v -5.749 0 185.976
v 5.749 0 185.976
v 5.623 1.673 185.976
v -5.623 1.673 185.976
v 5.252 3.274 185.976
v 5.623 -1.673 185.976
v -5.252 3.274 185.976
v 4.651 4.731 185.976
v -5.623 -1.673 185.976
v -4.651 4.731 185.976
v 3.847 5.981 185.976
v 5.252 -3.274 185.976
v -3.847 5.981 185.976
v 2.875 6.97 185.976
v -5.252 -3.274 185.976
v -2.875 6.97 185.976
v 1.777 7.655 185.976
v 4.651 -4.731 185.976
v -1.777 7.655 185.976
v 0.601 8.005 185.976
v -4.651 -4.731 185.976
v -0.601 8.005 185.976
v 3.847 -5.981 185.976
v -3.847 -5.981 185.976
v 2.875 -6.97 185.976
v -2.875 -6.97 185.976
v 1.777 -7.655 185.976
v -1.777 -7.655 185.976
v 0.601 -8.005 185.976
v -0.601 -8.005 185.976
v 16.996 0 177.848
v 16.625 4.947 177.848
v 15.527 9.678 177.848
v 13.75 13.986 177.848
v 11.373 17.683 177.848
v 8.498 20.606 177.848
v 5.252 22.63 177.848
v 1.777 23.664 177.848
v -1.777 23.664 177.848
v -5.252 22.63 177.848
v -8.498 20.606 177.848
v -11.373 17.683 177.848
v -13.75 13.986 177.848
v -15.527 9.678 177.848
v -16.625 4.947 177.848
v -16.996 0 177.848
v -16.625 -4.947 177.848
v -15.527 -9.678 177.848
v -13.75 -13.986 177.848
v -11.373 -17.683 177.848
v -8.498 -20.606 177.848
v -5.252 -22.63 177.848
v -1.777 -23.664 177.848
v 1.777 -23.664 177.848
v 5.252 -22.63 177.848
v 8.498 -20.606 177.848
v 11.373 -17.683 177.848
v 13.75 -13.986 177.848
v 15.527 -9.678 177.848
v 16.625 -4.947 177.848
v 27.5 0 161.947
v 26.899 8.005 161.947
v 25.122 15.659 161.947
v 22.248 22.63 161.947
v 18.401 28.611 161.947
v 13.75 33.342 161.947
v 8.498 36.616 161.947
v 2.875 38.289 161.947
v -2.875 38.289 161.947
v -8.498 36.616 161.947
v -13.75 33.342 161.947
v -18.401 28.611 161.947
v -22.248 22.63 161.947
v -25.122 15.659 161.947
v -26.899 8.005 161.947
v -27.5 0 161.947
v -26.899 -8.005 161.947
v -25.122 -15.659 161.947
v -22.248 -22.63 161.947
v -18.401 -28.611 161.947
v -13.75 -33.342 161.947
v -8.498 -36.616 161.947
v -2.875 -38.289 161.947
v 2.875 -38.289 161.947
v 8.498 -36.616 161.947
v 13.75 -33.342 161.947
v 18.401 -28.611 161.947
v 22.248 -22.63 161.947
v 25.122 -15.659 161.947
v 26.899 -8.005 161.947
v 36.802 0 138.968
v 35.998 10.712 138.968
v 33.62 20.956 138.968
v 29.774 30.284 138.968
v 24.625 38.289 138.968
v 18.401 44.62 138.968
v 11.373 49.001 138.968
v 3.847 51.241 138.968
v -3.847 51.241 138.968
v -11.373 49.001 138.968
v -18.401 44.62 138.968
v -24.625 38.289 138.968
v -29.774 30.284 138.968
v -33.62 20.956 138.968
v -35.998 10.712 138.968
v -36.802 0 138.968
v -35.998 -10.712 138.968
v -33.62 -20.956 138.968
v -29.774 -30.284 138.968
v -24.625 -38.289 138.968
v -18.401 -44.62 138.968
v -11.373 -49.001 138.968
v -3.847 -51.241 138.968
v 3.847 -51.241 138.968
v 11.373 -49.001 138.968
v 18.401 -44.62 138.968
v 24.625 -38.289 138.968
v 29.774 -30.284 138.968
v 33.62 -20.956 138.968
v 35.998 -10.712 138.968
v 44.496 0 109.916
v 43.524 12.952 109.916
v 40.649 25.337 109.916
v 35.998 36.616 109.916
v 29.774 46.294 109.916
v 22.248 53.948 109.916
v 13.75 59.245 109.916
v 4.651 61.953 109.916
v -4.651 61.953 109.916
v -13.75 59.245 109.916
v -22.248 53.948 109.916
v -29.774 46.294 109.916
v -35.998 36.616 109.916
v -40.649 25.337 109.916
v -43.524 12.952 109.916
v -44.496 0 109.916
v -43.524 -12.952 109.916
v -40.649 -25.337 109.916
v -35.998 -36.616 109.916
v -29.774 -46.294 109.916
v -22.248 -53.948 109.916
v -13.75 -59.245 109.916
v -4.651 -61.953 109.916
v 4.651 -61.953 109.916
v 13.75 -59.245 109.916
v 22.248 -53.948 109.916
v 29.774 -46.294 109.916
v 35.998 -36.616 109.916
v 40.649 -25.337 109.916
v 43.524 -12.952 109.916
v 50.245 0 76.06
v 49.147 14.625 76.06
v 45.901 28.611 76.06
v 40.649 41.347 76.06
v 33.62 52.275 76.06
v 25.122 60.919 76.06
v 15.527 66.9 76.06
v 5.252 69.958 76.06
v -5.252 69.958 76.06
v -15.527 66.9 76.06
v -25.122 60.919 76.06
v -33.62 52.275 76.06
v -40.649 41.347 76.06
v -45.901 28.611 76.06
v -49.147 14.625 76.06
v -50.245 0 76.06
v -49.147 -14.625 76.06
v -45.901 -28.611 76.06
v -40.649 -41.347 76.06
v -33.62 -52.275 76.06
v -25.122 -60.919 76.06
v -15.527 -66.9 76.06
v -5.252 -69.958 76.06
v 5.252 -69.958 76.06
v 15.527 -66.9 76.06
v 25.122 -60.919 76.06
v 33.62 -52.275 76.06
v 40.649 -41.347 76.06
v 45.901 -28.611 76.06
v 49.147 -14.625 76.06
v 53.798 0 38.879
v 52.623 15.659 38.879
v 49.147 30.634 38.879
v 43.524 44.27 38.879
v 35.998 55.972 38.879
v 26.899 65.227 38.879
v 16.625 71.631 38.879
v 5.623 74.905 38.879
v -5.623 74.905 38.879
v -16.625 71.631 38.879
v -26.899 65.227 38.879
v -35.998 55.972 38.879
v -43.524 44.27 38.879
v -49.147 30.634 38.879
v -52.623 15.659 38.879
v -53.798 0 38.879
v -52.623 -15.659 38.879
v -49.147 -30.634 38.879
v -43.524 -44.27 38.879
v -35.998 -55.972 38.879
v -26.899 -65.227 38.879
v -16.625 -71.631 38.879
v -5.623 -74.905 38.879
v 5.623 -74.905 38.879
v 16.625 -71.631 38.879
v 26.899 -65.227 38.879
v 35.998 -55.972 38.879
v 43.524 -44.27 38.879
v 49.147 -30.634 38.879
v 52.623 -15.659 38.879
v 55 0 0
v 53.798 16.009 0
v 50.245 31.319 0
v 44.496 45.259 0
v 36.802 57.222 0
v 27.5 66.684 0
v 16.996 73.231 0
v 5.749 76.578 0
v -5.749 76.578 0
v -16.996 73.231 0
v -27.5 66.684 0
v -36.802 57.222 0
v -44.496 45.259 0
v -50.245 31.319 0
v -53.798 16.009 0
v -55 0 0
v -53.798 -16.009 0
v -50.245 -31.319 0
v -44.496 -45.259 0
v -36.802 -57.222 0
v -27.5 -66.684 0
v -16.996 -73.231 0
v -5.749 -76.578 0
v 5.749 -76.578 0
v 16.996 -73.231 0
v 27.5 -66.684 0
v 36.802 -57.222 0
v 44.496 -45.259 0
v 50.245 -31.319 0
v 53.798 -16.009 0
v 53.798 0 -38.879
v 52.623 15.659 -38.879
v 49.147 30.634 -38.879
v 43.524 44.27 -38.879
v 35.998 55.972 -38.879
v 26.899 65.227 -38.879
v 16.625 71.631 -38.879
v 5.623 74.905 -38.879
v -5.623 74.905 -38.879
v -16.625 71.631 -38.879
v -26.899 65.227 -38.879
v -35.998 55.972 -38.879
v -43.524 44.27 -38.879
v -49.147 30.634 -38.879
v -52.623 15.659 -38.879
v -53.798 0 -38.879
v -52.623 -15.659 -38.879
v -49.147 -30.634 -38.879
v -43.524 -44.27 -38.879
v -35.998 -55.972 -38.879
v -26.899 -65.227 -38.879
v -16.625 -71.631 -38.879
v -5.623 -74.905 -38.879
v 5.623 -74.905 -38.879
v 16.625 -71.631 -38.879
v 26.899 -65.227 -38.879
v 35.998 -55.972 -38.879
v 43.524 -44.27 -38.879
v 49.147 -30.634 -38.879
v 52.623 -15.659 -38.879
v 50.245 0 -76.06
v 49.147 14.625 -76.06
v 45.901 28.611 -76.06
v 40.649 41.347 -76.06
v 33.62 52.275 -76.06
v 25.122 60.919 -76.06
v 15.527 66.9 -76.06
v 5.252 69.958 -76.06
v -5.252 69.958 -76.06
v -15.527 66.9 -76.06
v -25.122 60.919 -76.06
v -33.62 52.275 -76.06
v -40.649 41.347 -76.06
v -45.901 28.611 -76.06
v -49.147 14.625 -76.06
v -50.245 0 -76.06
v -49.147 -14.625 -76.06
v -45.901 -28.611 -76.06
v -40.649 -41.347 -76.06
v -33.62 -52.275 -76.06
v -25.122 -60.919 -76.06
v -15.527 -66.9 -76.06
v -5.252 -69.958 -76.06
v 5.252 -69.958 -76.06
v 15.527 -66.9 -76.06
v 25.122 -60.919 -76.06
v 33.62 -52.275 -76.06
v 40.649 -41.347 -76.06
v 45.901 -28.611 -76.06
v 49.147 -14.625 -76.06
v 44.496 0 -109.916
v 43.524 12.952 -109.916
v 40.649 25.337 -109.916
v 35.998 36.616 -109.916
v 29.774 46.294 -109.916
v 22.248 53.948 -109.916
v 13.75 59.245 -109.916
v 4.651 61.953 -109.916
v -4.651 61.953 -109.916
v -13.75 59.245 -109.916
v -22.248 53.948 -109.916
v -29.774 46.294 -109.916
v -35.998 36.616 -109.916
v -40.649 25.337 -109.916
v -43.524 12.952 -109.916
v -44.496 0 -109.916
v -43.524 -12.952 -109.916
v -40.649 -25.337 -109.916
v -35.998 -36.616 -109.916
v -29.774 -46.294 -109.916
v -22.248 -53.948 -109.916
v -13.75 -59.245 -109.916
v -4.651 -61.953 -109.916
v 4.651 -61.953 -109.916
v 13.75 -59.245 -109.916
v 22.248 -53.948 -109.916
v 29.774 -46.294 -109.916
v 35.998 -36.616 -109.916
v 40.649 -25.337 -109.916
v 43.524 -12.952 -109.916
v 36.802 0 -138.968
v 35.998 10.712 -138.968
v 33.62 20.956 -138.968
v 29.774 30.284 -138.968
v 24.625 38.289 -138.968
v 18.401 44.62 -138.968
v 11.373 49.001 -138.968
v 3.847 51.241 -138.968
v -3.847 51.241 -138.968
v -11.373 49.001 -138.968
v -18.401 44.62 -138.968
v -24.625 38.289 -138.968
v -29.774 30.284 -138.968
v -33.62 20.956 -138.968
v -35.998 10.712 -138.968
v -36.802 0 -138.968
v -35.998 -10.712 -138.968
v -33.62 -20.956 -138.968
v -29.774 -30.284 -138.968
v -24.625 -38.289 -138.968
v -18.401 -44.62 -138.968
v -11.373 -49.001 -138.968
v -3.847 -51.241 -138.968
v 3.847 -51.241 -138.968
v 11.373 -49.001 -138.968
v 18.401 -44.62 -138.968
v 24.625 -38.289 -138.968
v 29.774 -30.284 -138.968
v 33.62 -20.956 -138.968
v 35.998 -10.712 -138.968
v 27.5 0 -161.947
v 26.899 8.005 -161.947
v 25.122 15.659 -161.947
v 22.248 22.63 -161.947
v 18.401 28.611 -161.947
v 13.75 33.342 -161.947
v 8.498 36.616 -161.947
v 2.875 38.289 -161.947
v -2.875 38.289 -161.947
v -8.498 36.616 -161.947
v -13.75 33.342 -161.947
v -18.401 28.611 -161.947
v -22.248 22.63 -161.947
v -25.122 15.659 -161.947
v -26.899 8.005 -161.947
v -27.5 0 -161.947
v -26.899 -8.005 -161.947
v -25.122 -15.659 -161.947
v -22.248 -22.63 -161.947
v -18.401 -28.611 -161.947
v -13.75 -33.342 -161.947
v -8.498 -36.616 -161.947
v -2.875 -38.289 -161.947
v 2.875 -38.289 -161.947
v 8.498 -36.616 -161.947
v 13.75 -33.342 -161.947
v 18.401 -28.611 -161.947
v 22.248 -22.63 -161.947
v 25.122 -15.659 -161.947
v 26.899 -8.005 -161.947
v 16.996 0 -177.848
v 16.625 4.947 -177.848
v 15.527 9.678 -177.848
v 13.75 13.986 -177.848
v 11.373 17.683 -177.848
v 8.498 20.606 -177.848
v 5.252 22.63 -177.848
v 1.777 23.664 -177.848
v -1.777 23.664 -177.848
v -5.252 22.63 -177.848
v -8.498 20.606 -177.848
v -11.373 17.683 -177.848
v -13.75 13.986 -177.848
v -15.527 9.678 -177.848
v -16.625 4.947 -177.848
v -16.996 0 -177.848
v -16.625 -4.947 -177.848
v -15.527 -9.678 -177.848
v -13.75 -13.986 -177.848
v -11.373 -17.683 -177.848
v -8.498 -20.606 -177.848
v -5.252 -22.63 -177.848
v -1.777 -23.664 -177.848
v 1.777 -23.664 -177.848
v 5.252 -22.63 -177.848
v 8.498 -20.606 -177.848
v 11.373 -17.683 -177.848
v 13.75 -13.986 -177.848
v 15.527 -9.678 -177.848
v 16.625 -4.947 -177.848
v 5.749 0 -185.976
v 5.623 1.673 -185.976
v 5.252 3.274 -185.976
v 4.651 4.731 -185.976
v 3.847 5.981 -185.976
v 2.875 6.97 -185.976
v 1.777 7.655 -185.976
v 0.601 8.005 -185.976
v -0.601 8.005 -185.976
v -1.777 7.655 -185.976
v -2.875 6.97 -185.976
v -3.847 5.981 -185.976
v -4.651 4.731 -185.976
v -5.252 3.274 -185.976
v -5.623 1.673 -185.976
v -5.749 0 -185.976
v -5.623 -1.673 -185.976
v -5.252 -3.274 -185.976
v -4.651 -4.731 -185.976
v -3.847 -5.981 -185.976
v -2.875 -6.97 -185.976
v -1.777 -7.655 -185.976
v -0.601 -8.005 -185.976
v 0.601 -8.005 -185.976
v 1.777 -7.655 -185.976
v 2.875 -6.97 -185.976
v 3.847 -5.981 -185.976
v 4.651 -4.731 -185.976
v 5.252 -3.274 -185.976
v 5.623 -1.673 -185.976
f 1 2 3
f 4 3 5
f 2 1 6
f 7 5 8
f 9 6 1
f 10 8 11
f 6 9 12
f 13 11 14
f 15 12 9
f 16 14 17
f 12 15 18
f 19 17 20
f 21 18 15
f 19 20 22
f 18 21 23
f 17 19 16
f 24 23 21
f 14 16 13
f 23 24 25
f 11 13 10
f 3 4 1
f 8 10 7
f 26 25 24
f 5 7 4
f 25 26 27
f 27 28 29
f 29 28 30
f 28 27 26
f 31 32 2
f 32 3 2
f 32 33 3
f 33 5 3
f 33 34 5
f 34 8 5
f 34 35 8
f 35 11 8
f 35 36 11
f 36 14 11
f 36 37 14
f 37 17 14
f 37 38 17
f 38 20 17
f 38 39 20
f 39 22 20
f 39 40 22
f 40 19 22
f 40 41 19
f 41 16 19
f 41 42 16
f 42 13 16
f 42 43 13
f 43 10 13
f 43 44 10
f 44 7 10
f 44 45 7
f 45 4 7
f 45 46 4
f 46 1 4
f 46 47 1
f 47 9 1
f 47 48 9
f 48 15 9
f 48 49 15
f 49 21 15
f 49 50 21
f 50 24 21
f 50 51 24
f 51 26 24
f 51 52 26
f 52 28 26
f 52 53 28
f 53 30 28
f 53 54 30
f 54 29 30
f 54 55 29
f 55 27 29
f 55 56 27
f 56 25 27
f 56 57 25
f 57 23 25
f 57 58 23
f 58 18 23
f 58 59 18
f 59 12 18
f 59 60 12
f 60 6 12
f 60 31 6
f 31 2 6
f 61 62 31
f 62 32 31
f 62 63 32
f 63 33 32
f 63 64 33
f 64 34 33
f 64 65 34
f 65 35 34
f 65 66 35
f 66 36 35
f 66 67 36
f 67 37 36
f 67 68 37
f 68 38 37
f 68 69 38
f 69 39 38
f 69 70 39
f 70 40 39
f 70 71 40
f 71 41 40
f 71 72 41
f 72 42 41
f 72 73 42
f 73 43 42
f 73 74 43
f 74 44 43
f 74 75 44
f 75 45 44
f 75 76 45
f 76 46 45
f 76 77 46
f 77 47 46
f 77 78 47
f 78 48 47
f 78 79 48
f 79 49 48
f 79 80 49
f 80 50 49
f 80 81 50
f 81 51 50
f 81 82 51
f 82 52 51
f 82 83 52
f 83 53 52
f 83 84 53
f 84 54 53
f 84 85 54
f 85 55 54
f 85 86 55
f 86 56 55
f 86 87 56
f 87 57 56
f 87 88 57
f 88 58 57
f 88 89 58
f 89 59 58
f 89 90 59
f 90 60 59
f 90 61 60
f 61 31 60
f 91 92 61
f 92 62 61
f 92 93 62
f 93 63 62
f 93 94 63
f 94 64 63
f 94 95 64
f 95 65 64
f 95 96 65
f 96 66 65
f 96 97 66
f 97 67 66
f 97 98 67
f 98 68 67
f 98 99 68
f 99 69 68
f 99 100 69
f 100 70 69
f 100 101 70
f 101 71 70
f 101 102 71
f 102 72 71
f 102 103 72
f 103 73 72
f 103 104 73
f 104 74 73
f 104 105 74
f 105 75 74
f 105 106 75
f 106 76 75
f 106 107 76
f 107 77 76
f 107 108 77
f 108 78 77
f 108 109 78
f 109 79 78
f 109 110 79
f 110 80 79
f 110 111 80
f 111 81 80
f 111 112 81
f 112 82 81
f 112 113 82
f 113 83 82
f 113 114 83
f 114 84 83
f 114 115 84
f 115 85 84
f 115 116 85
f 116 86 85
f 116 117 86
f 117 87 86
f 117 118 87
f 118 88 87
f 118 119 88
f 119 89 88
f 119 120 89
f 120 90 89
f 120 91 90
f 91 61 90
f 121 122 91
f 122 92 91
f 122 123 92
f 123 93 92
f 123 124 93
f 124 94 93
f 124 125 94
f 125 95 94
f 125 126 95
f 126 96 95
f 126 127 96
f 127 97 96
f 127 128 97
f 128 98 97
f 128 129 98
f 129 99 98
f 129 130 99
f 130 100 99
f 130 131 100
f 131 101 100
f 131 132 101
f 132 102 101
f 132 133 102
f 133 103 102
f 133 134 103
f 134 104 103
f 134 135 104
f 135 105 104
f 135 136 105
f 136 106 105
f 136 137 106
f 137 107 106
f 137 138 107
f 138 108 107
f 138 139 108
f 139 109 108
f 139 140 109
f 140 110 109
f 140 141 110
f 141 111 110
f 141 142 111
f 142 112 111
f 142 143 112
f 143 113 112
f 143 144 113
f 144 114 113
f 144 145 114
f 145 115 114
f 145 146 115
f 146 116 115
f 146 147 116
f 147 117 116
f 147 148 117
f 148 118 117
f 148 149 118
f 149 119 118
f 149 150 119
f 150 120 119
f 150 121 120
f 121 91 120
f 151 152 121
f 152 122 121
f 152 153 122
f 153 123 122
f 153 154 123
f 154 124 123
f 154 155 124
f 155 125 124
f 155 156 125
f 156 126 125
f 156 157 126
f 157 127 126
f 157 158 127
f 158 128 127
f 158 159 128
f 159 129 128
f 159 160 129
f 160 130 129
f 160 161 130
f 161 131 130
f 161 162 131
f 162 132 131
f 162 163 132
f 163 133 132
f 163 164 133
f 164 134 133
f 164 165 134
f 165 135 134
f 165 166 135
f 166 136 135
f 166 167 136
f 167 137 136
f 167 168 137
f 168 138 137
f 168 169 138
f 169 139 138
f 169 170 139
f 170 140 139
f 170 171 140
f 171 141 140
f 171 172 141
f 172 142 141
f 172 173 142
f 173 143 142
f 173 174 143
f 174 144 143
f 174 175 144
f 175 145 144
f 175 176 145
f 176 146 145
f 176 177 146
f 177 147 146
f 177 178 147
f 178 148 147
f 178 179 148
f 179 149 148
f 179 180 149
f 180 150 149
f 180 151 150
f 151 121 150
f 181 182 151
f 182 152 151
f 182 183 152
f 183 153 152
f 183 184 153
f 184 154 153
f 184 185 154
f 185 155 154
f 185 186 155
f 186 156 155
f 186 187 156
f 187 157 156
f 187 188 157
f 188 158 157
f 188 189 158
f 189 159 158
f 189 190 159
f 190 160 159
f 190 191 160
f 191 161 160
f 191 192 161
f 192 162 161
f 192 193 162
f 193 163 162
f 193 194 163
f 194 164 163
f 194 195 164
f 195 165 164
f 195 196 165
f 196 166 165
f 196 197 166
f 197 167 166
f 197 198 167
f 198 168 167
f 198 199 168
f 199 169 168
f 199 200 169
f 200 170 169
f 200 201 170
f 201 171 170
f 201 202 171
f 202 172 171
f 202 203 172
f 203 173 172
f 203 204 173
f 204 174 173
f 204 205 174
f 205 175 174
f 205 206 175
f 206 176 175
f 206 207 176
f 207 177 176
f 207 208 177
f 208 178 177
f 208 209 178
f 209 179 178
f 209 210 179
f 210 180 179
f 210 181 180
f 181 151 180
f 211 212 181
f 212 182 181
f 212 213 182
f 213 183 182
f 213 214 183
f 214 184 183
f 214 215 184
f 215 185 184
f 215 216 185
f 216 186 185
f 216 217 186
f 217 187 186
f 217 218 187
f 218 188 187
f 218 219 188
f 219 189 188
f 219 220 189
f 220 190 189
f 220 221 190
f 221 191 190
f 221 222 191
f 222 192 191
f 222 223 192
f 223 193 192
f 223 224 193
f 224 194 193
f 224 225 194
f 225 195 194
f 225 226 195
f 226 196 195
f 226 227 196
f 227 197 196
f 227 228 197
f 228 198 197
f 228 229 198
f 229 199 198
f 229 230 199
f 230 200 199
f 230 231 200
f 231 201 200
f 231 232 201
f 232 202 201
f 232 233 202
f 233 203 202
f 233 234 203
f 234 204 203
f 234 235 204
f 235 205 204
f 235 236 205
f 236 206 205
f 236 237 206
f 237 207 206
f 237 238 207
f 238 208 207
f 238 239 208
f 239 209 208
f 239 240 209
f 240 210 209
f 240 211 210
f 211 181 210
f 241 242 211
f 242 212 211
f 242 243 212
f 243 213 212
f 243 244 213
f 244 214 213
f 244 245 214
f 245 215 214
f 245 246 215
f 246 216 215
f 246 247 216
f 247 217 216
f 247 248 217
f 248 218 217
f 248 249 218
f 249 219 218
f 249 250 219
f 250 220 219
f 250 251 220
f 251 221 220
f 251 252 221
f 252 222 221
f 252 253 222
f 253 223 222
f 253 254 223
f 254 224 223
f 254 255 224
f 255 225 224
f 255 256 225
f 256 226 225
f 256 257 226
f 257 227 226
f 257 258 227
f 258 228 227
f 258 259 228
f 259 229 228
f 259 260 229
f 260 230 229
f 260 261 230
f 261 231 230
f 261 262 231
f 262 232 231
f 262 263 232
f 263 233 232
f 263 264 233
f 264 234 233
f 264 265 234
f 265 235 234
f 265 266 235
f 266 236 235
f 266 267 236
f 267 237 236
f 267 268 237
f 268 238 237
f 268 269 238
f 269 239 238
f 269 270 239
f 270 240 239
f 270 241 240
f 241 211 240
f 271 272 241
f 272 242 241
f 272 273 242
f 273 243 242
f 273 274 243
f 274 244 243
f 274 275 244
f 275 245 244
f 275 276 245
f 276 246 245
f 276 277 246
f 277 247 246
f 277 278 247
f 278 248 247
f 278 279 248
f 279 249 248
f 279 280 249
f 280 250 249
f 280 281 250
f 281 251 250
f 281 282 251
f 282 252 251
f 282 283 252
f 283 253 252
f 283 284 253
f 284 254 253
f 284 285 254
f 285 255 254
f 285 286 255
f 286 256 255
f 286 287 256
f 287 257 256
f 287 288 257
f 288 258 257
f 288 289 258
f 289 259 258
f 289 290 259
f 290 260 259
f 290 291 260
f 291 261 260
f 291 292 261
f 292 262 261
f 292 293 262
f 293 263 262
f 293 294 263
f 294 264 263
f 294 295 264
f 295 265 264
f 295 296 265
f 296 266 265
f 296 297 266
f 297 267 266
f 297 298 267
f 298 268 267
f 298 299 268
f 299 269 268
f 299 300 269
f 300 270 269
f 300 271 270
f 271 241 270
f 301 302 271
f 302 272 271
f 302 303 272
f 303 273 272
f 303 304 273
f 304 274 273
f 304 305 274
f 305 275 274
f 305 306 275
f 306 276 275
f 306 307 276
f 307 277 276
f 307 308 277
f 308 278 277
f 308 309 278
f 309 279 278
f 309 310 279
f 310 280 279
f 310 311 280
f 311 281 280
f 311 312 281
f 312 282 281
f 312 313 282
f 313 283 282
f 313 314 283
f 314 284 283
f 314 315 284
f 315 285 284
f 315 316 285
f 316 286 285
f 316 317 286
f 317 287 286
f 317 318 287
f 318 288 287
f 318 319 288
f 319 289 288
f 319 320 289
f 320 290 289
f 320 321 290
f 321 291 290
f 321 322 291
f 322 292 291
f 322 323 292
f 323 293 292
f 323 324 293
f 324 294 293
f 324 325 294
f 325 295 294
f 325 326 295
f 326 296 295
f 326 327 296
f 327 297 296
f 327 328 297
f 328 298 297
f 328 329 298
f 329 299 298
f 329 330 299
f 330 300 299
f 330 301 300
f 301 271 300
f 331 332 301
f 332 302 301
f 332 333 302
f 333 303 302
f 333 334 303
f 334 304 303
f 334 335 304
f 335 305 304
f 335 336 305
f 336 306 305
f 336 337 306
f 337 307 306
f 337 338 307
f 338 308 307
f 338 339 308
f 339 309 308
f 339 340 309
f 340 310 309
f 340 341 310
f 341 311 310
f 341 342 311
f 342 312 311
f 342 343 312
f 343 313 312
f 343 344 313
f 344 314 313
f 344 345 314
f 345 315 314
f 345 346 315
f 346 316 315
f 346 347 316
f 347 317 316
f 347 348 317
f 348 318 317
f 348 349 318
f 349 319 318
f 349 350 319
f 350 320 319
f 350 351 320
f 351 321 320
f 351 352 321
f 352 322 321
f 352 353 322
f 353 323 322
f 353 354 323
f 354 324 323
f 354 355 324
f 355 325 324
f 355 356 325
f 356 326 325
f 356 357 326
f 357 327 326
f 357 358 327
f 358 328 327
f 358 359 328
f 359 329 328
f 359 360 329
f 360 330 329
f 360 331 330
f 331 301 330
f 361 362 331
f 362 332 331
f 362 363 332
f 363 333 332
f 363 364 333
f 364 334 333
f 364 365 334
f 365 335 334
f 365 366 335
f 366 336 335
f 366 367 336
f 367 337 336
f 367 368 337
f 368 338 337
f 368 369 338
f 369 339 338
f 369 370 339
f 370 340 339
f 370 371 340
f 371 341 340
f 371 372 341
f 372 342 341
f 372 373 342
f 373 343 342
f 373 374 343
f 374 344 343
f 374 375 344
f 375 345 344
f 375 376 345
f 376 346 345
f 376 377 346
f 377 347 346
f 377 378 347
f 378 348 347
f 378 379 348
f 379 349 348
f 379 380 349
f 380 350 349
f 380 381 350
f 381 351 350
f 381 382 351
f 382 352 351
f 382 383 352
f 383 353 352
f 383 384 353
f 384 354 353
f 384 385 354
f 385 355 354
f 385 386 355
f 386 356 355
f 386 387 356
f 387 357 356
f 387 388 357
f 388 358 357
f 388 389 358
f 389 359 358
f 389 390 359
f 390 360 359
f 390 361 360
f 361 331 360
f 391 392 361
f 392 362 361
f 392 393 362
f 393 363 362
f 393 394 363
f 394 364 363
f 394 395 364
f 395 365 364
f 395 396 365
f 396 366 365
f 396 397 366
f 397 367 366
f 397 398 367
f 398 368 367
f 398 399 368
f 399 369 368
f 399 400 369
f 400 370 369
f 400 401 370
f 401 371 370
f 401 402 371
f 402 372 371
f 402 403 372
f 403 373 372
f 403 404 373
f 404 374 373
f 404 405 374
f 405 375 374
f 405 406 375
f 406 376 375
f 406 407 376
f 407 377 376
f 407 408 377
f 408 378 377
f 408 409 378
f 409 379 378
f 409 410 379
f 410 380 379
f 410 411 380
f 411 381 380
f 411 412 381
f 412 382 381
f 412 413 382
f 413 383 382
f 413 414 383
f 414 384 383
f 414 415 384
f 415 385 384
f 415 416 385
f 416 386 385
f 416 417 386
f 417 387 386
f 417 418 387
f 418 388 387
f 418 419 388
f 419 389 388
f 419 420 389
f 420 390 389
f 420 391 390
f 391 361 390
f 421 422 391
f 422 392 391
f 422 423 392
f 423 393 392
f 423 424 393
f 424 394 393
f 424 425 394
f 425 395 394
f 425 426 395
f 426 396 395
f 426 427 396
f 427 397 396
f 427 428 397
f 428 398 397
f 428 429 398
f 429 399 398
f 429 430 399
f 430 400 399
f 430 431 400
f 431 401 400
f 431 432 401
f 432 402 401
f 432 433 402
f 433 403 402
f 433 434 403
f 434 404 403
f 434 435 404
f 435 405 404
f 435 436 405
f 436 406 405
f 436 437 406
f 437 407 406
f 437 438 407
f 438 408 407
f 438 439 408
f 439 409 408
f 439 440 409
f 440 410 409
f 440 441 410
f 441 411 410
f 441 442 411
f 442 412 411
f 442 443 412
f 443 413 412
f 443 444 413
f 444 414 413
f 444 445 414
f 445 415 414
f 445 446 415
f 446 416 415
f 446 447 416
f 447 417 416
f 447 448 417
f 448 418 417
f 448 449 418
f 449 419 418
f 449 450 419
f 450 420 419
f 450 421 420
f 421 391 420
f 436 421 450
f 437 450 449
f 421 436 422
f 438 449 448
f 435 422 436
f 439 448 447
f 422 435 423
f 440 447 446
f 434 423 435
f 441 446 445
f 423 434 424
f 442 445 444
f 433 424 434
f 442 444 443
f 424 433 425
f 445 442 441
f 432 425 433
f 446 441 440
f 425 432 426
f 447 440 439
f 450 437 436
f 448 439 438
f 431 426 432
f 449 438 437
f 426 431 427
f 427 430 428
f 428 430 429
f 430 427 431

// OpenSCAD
// Generated by SolidPython 1.0.1 on 2020-07-29 00:46:46


scale(v = [5, 7, 17]) {
	sphere(r = 11);
}
/***********************************************
*********      SolidPython code:      **********
************************************************
 
# import packages: SolidPython
from solid import *
from solid.utils import *
from itertools import chain, combinations, permutations


class Resize:

    def __init__(self, scad_file):
        self.scad_file = scad_file
        #self.scad_file = import_scad(scad_file)
        # cone/cylinder param:
        self.r1 = 0
        self.r2 = 0
        self.h = 0
        # rectangular prism param:
        self.w = 0
        self.l = 0
        # ellipse param:
        self.r = 0

    # import OpenScad code (file name corresponds to shape)


    # classify shape + parameters
    def assign(self, param1, param2, param3):
        if self.scad_file == 'cone.scad':
            self.r1 = param1
            self.r2 = param2
            self.h = param3
        elif self.scad_file == 'cylinder.scad':
            self.r1 = param1
            self.r2 = param2
            self.h = param3
        elif self.scad_file == 'rectangularPrism.scad':
            self.h = param1
            self.l = param2
            self.w = param3
        else:
            self.r = param1
            self.h = param2

    # resize parameters
    def iterate(self):
        x = range(3, 20, 2)
        i = 1
        if self.scad_file == 'cone.scad':
            tempList = list(permutations(x, 2))
            for temp in tempList:
                param1 = temp[0]
                param2 = temp[1]
                filepath = 'produced_scad_files/' + 'cone' + str(param1) + '_' + str(param2) + '_' + '.scad'
                scad_render_to_file(cylinder(h=param1, r1=param2, r2=0), filepath)

        elif self.scad_file == 'cylinder.scad':
            tempList = list(permutations(x, 3))
            for temp in tempList:
                param1 = temp[0]
                param2 = temp[1]
                filepath = 'produced_scad_files/' + 'cylinder' + str(param1) + '_' + str(param2) + '_' + '.scad'
                scad_render_to_file(cylinder(h=param1, r1=param2, r2=param2), filepath)

        elif self.scad_file == 'rectangularPrism.scad':
            tempList = list(permutations(x, 3))
            for temp in tempList:
                param1 = temp[0]
                param2 = temp[1]
                param3 = temp[2]
                filepath = 'produced_scad_files/' + 'rectangularPrism' + str(param1) + '_' + str(param2) + '_' + str(
                    param3) + '.scad'
                scad_render_to_file(cube(size=(param1, param2, param3)), filepath)

        elif self.scad_file == 'ellipse.scad':
            tempList = list(permutations(x, 4))
            for temp in tempList:
                param1 = temp[0]
                param2 = temp[1]
                param3 = temp[2]
                param4 = temp[3]
                filepath = 'produced_scad_files/' + 'ellipse' + str(param1) + '_' + str(param2) + '_' + str(param3) + '_' + str(param4) + '.scad'
                scad_render_to_file(scale([param1, param2, param3])(sphere(r=param4)), filepath)

    def render_to_scadfile(self):
        scad_render_to_file(scad, 'example.scad') 
 
************************************************/
